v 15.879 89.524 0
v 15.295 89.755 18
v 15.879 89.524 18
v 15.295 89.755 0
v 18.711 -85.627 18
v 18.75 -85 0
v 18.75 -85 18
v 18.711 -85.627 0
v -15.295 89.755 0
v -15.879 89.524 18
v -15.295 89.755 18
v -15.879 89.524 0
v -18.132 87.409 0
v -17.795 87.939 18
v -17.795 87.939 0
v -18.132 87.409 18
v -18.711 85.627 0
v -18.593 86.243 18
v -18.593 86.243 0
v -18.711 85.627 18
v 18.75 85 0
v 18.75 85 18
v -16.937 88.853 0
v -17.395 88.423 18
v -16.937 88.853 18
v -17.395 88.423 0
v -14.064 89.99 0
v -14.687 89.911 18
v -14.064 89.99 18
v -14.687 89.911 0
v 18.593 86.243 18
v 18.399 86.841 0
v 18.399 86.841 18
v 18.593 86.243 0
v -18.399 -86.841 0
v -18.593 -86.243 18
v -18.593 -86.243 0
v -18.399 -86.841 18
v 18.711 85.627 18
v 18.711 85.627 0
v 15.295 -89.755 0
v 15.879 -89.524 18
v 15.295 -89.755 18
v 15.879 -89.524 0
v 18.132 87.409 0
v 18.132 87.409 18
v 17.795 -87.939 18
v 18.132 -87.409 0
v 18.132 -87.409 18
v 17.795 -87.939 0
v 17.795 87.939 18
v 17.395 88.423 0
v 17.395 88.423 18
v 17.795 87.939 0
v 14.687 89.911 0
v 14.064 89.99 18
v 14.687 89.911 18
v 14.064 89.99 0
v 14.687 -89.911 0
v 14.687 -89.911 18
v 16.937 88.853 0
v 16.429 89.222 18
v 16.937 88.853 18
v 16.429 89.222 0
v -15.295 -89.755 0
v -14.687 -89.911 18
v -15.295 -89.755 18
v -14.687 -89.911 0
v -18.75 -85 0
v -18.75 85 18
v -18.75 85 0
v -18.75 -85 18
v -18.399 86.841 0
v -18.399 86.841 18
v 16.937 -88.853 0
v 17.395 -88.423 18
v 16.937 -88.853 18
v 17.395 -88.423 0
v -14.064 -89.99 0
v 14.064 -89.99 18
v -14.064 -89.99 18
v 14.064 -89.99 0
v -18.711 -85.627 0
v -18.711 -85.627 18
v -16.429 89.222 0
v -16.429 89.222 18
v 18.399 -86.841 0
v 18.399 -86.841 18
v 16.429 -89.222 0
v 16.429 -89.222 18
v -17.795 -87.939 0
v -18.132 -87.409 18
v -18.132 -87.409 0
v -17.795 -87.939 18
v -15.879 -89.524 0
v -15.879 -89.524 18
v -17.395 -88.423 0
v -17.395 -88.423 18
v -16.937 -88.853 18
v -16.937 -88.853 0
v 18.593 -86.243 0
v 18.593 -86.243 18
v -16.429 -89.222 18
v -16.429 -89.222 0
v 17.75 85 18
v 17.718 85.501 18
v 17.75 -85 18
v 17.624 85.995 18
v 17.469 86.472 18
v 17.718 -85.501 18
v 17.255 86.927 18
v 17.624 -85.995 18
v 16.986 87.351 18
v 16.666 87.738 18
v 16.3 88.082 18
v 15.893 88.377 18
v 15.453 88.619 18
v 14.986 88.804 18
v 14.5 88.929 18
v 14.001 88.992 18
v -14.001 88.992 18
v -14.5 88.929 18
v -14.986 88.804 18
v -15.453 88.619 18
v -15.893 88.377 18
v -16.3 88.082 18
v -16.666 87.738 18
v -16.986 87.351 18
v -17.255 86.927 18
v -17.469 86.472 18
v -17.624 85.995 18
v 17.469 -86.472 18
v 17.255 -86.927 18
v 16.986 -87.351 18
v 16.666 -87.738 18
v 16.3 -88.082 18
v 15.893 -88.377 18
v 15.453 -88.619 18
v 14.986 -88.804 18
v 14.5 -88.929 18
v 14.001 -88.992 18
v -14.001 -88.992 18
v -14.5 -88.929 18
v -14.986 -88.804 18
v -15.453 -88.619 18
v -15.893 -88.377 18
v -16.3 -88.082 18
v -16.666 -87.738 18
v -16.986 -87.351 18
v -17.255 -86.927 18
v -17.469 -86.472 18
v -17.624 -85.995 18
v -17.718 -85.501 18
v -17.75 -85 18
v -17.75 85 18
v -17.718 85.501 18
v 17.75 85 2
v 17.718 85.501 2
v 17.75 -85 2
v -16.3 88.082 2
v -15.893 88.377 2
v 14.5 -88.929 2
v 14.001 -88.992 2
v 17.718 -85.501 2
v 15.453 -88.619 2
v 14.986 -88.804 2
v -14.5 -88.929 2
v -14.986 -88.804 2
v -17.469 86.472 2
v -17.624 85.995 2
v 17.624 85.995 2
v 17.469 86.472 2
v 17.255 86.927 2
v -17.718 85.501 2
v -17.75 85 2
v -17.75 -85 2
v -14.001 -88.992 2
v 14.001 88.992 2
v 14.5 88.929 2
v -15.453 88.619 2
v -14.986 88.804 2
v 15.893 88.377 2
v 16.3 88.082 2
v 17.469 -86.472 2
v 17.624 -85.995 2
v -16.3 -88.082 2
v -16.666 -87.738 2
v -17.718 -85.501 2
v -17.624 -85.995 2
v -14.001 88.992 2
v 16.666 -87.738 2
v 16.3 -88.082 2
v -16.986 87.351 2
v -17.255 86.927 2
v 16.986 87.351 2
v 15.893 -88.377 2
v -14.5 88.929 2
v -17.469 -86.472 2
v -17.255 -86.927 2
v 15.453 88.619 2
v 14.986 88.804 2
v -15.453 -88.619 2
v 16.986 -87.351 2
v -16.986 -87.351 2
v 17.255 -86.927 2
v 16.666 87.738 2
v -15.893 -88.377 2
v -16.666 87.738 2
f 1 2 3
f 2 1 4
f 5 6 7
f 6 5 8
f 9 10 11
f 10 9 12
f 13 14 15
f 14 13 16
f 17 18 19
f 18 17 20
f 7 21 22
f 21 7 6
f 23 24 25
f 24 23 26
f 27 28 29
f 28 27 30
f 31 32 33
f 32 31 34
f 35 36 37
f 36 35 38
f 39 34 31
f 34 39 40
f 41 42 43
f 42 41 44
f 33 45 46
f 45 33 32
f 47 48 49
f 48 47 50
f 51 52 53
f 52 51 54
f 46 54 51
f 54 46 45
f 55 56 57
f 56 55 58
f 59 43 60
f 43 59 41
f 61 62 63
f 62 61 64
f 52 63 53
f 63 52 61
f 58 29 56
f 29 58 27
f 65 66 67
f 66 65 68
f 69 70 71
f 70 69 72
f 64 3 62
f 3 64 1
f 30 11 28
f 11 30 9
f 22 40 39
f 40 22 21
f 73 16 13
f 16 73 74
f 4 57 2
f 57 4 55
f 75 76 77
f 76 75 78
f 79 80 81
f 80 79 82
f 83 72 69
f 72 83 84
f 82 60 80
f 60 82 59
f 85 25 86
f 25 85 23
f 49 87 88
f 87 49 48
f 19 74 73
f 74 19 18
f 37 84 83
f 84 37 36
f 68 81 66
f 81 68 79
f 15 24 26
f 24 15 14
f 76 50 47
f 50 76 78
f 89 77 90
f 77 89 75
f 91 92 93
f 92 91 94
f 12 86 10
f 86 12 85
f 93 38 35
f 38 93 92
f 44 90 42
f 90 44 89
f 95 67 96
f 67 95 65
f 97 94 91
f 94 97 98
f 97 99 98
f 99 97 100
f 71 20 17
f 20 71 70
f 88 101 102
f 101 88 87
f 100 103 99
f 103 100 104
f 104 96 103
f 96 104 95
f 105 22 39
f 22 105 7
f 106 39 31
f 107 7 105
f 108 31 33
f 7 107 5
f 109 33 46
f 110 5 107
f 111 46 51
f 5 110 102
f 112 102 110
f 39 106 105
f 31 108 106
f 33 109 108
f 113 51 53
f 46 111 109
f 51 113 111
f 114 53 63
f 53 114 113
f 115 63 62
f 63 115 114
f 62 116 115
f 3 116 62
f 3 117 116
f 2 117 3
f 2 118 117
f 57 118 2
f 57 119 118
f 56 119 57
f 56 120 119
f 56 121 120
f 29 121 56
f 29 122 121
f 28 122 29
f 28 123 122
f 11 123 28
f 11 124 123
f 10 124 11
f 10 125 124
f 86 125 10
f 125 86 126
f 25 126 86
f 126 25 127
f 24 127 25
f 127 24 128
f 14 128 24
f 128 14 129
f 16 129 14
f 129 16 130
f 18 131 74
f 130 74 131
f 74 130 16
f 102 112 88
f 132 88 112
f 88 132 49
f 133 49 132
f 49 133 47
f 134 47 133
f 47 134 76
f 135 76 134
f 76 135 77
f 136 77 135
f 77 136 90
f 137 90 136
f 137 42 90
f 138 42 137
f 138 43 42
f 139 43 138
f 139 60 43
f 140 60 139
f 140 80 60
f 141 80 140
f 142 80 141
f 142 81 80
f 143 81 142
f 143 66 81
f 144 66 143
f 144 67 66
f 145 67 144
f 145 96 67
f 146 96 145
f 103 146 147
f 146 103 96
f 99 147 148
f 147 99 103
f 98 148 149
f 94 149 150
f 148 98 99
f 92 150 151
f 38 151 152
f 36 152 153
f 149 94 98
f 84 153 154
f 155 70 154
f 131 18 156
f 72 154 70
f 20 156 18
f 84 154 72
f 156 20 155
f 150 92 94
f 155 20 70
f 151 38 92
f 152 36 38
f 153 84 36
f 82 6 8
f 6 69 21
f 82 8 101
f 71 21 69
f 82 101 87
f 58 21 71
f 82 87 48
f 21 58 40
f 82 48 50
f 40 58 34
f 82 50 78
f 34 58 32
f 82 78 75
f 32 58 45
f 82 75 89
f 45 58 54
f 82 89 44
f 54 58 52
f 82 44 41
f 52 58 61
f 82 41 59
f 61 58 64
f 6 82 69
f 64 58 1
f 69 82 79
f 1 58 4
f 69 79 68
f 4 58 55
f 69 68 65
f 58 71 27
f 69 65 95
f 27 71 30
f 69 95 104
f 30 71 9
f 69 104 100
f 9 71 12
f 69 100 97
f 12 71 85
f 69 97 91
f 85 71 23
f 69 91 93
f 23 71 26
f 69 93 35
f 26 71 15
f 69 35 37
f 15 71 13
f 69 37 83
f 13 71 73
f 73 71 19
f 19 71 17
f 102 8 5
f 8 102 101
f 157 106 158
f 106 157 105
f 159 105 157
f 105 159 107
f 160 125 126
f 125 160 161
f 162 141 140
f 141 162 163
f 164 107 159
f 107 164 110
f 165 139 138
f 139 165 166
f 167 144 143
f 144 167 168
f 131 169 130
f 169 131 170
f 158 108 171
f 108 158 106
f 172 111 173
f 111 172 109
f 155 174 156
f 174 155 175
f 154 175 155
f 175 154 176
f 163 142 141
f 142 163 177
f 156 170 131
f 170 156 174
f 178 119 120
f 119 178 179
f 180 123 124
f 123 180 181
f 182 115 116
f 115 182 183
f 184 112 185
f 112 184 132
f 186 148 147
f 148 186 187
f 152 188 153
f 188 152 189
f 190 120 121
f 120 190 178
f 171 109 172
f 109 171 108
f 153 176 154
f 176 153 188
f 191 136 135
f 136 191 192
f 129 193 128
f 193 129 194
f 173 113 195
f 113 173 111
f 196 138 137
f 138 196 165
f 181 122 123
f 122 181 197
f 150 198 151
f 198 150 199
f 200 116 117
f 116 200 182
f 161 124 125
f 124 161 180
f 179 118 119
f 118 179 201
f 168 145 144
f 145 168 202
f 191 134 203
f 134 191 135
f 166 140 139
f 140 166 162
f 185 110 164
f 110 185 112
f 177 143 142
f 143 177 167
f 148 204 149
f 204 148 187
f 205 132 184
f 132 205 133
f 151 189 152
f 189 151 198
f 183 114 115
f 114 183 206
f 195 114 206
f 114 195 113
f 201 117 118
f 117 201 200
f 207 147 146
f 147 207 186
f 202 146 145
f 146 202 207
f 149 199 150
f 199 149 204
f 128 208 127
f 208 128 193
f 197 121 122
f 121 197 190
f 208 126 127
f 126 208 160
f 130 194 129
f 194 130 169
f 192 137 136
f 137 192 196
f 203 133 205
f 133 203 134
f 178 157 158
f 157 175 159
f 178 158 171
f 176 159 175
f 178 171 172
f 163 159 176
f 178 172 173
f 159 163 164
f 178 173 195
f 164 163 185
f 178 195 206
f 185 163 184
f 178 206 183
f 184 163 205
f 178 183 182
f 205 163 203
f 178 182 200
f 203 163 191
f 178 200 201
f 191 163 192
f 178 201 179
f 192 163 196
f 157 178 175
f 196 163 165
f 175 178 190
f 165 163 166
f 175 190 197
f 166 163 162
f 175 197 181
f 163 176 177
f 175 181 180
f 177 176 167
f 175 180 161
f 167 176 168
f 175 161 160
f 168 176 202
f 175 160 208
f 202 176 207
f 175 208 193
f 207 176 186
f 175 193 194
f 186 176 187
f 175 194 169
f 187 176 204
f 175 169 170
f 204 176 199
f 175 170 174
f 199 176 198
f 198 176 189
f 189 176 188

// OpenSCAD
$fn = 50;


difference() {
	union() {
		hull() {
			translate(v = [-13.7500000000, 85.0000000000, 0]) {
				cylinder(h = 18, r = 5);
			}
			translate(v = [13.7500000000, 85.0000000000, 0]) {
				cylinder(h = 18, r = 5);
			}
			translate(v = [-13.7500000000, -85.0000000000, 0]) {
				cylinder(h = 18, r = 5);
			}
			translate(v = [13.7500000000, -85.0000000000, 0]) {
				cylinder(h = 18, r = 5);
			}
		}
	}
	union() {
		translate(v = [0, 0, 2]) {
			hull() {
				translate(v = [-13.7500000000, 85.0000000000, 0]) {
					cylinder(h = 16, r = 4);
				}
				translate(v = [13.7500000000, 85.0000000000, 0]) {
					cylinder(h = 16, r = 4);
				}
				translate(v = [-13.7500000000, -85.0000000000, 0]) {
					cylinder(h = 16, r = 4);
				}
				translate(v = [13.7500000000, -85.0000000000, 0]) {
					cylinder(h = 16, r = 4);
				}
			}
		}
	}
}
